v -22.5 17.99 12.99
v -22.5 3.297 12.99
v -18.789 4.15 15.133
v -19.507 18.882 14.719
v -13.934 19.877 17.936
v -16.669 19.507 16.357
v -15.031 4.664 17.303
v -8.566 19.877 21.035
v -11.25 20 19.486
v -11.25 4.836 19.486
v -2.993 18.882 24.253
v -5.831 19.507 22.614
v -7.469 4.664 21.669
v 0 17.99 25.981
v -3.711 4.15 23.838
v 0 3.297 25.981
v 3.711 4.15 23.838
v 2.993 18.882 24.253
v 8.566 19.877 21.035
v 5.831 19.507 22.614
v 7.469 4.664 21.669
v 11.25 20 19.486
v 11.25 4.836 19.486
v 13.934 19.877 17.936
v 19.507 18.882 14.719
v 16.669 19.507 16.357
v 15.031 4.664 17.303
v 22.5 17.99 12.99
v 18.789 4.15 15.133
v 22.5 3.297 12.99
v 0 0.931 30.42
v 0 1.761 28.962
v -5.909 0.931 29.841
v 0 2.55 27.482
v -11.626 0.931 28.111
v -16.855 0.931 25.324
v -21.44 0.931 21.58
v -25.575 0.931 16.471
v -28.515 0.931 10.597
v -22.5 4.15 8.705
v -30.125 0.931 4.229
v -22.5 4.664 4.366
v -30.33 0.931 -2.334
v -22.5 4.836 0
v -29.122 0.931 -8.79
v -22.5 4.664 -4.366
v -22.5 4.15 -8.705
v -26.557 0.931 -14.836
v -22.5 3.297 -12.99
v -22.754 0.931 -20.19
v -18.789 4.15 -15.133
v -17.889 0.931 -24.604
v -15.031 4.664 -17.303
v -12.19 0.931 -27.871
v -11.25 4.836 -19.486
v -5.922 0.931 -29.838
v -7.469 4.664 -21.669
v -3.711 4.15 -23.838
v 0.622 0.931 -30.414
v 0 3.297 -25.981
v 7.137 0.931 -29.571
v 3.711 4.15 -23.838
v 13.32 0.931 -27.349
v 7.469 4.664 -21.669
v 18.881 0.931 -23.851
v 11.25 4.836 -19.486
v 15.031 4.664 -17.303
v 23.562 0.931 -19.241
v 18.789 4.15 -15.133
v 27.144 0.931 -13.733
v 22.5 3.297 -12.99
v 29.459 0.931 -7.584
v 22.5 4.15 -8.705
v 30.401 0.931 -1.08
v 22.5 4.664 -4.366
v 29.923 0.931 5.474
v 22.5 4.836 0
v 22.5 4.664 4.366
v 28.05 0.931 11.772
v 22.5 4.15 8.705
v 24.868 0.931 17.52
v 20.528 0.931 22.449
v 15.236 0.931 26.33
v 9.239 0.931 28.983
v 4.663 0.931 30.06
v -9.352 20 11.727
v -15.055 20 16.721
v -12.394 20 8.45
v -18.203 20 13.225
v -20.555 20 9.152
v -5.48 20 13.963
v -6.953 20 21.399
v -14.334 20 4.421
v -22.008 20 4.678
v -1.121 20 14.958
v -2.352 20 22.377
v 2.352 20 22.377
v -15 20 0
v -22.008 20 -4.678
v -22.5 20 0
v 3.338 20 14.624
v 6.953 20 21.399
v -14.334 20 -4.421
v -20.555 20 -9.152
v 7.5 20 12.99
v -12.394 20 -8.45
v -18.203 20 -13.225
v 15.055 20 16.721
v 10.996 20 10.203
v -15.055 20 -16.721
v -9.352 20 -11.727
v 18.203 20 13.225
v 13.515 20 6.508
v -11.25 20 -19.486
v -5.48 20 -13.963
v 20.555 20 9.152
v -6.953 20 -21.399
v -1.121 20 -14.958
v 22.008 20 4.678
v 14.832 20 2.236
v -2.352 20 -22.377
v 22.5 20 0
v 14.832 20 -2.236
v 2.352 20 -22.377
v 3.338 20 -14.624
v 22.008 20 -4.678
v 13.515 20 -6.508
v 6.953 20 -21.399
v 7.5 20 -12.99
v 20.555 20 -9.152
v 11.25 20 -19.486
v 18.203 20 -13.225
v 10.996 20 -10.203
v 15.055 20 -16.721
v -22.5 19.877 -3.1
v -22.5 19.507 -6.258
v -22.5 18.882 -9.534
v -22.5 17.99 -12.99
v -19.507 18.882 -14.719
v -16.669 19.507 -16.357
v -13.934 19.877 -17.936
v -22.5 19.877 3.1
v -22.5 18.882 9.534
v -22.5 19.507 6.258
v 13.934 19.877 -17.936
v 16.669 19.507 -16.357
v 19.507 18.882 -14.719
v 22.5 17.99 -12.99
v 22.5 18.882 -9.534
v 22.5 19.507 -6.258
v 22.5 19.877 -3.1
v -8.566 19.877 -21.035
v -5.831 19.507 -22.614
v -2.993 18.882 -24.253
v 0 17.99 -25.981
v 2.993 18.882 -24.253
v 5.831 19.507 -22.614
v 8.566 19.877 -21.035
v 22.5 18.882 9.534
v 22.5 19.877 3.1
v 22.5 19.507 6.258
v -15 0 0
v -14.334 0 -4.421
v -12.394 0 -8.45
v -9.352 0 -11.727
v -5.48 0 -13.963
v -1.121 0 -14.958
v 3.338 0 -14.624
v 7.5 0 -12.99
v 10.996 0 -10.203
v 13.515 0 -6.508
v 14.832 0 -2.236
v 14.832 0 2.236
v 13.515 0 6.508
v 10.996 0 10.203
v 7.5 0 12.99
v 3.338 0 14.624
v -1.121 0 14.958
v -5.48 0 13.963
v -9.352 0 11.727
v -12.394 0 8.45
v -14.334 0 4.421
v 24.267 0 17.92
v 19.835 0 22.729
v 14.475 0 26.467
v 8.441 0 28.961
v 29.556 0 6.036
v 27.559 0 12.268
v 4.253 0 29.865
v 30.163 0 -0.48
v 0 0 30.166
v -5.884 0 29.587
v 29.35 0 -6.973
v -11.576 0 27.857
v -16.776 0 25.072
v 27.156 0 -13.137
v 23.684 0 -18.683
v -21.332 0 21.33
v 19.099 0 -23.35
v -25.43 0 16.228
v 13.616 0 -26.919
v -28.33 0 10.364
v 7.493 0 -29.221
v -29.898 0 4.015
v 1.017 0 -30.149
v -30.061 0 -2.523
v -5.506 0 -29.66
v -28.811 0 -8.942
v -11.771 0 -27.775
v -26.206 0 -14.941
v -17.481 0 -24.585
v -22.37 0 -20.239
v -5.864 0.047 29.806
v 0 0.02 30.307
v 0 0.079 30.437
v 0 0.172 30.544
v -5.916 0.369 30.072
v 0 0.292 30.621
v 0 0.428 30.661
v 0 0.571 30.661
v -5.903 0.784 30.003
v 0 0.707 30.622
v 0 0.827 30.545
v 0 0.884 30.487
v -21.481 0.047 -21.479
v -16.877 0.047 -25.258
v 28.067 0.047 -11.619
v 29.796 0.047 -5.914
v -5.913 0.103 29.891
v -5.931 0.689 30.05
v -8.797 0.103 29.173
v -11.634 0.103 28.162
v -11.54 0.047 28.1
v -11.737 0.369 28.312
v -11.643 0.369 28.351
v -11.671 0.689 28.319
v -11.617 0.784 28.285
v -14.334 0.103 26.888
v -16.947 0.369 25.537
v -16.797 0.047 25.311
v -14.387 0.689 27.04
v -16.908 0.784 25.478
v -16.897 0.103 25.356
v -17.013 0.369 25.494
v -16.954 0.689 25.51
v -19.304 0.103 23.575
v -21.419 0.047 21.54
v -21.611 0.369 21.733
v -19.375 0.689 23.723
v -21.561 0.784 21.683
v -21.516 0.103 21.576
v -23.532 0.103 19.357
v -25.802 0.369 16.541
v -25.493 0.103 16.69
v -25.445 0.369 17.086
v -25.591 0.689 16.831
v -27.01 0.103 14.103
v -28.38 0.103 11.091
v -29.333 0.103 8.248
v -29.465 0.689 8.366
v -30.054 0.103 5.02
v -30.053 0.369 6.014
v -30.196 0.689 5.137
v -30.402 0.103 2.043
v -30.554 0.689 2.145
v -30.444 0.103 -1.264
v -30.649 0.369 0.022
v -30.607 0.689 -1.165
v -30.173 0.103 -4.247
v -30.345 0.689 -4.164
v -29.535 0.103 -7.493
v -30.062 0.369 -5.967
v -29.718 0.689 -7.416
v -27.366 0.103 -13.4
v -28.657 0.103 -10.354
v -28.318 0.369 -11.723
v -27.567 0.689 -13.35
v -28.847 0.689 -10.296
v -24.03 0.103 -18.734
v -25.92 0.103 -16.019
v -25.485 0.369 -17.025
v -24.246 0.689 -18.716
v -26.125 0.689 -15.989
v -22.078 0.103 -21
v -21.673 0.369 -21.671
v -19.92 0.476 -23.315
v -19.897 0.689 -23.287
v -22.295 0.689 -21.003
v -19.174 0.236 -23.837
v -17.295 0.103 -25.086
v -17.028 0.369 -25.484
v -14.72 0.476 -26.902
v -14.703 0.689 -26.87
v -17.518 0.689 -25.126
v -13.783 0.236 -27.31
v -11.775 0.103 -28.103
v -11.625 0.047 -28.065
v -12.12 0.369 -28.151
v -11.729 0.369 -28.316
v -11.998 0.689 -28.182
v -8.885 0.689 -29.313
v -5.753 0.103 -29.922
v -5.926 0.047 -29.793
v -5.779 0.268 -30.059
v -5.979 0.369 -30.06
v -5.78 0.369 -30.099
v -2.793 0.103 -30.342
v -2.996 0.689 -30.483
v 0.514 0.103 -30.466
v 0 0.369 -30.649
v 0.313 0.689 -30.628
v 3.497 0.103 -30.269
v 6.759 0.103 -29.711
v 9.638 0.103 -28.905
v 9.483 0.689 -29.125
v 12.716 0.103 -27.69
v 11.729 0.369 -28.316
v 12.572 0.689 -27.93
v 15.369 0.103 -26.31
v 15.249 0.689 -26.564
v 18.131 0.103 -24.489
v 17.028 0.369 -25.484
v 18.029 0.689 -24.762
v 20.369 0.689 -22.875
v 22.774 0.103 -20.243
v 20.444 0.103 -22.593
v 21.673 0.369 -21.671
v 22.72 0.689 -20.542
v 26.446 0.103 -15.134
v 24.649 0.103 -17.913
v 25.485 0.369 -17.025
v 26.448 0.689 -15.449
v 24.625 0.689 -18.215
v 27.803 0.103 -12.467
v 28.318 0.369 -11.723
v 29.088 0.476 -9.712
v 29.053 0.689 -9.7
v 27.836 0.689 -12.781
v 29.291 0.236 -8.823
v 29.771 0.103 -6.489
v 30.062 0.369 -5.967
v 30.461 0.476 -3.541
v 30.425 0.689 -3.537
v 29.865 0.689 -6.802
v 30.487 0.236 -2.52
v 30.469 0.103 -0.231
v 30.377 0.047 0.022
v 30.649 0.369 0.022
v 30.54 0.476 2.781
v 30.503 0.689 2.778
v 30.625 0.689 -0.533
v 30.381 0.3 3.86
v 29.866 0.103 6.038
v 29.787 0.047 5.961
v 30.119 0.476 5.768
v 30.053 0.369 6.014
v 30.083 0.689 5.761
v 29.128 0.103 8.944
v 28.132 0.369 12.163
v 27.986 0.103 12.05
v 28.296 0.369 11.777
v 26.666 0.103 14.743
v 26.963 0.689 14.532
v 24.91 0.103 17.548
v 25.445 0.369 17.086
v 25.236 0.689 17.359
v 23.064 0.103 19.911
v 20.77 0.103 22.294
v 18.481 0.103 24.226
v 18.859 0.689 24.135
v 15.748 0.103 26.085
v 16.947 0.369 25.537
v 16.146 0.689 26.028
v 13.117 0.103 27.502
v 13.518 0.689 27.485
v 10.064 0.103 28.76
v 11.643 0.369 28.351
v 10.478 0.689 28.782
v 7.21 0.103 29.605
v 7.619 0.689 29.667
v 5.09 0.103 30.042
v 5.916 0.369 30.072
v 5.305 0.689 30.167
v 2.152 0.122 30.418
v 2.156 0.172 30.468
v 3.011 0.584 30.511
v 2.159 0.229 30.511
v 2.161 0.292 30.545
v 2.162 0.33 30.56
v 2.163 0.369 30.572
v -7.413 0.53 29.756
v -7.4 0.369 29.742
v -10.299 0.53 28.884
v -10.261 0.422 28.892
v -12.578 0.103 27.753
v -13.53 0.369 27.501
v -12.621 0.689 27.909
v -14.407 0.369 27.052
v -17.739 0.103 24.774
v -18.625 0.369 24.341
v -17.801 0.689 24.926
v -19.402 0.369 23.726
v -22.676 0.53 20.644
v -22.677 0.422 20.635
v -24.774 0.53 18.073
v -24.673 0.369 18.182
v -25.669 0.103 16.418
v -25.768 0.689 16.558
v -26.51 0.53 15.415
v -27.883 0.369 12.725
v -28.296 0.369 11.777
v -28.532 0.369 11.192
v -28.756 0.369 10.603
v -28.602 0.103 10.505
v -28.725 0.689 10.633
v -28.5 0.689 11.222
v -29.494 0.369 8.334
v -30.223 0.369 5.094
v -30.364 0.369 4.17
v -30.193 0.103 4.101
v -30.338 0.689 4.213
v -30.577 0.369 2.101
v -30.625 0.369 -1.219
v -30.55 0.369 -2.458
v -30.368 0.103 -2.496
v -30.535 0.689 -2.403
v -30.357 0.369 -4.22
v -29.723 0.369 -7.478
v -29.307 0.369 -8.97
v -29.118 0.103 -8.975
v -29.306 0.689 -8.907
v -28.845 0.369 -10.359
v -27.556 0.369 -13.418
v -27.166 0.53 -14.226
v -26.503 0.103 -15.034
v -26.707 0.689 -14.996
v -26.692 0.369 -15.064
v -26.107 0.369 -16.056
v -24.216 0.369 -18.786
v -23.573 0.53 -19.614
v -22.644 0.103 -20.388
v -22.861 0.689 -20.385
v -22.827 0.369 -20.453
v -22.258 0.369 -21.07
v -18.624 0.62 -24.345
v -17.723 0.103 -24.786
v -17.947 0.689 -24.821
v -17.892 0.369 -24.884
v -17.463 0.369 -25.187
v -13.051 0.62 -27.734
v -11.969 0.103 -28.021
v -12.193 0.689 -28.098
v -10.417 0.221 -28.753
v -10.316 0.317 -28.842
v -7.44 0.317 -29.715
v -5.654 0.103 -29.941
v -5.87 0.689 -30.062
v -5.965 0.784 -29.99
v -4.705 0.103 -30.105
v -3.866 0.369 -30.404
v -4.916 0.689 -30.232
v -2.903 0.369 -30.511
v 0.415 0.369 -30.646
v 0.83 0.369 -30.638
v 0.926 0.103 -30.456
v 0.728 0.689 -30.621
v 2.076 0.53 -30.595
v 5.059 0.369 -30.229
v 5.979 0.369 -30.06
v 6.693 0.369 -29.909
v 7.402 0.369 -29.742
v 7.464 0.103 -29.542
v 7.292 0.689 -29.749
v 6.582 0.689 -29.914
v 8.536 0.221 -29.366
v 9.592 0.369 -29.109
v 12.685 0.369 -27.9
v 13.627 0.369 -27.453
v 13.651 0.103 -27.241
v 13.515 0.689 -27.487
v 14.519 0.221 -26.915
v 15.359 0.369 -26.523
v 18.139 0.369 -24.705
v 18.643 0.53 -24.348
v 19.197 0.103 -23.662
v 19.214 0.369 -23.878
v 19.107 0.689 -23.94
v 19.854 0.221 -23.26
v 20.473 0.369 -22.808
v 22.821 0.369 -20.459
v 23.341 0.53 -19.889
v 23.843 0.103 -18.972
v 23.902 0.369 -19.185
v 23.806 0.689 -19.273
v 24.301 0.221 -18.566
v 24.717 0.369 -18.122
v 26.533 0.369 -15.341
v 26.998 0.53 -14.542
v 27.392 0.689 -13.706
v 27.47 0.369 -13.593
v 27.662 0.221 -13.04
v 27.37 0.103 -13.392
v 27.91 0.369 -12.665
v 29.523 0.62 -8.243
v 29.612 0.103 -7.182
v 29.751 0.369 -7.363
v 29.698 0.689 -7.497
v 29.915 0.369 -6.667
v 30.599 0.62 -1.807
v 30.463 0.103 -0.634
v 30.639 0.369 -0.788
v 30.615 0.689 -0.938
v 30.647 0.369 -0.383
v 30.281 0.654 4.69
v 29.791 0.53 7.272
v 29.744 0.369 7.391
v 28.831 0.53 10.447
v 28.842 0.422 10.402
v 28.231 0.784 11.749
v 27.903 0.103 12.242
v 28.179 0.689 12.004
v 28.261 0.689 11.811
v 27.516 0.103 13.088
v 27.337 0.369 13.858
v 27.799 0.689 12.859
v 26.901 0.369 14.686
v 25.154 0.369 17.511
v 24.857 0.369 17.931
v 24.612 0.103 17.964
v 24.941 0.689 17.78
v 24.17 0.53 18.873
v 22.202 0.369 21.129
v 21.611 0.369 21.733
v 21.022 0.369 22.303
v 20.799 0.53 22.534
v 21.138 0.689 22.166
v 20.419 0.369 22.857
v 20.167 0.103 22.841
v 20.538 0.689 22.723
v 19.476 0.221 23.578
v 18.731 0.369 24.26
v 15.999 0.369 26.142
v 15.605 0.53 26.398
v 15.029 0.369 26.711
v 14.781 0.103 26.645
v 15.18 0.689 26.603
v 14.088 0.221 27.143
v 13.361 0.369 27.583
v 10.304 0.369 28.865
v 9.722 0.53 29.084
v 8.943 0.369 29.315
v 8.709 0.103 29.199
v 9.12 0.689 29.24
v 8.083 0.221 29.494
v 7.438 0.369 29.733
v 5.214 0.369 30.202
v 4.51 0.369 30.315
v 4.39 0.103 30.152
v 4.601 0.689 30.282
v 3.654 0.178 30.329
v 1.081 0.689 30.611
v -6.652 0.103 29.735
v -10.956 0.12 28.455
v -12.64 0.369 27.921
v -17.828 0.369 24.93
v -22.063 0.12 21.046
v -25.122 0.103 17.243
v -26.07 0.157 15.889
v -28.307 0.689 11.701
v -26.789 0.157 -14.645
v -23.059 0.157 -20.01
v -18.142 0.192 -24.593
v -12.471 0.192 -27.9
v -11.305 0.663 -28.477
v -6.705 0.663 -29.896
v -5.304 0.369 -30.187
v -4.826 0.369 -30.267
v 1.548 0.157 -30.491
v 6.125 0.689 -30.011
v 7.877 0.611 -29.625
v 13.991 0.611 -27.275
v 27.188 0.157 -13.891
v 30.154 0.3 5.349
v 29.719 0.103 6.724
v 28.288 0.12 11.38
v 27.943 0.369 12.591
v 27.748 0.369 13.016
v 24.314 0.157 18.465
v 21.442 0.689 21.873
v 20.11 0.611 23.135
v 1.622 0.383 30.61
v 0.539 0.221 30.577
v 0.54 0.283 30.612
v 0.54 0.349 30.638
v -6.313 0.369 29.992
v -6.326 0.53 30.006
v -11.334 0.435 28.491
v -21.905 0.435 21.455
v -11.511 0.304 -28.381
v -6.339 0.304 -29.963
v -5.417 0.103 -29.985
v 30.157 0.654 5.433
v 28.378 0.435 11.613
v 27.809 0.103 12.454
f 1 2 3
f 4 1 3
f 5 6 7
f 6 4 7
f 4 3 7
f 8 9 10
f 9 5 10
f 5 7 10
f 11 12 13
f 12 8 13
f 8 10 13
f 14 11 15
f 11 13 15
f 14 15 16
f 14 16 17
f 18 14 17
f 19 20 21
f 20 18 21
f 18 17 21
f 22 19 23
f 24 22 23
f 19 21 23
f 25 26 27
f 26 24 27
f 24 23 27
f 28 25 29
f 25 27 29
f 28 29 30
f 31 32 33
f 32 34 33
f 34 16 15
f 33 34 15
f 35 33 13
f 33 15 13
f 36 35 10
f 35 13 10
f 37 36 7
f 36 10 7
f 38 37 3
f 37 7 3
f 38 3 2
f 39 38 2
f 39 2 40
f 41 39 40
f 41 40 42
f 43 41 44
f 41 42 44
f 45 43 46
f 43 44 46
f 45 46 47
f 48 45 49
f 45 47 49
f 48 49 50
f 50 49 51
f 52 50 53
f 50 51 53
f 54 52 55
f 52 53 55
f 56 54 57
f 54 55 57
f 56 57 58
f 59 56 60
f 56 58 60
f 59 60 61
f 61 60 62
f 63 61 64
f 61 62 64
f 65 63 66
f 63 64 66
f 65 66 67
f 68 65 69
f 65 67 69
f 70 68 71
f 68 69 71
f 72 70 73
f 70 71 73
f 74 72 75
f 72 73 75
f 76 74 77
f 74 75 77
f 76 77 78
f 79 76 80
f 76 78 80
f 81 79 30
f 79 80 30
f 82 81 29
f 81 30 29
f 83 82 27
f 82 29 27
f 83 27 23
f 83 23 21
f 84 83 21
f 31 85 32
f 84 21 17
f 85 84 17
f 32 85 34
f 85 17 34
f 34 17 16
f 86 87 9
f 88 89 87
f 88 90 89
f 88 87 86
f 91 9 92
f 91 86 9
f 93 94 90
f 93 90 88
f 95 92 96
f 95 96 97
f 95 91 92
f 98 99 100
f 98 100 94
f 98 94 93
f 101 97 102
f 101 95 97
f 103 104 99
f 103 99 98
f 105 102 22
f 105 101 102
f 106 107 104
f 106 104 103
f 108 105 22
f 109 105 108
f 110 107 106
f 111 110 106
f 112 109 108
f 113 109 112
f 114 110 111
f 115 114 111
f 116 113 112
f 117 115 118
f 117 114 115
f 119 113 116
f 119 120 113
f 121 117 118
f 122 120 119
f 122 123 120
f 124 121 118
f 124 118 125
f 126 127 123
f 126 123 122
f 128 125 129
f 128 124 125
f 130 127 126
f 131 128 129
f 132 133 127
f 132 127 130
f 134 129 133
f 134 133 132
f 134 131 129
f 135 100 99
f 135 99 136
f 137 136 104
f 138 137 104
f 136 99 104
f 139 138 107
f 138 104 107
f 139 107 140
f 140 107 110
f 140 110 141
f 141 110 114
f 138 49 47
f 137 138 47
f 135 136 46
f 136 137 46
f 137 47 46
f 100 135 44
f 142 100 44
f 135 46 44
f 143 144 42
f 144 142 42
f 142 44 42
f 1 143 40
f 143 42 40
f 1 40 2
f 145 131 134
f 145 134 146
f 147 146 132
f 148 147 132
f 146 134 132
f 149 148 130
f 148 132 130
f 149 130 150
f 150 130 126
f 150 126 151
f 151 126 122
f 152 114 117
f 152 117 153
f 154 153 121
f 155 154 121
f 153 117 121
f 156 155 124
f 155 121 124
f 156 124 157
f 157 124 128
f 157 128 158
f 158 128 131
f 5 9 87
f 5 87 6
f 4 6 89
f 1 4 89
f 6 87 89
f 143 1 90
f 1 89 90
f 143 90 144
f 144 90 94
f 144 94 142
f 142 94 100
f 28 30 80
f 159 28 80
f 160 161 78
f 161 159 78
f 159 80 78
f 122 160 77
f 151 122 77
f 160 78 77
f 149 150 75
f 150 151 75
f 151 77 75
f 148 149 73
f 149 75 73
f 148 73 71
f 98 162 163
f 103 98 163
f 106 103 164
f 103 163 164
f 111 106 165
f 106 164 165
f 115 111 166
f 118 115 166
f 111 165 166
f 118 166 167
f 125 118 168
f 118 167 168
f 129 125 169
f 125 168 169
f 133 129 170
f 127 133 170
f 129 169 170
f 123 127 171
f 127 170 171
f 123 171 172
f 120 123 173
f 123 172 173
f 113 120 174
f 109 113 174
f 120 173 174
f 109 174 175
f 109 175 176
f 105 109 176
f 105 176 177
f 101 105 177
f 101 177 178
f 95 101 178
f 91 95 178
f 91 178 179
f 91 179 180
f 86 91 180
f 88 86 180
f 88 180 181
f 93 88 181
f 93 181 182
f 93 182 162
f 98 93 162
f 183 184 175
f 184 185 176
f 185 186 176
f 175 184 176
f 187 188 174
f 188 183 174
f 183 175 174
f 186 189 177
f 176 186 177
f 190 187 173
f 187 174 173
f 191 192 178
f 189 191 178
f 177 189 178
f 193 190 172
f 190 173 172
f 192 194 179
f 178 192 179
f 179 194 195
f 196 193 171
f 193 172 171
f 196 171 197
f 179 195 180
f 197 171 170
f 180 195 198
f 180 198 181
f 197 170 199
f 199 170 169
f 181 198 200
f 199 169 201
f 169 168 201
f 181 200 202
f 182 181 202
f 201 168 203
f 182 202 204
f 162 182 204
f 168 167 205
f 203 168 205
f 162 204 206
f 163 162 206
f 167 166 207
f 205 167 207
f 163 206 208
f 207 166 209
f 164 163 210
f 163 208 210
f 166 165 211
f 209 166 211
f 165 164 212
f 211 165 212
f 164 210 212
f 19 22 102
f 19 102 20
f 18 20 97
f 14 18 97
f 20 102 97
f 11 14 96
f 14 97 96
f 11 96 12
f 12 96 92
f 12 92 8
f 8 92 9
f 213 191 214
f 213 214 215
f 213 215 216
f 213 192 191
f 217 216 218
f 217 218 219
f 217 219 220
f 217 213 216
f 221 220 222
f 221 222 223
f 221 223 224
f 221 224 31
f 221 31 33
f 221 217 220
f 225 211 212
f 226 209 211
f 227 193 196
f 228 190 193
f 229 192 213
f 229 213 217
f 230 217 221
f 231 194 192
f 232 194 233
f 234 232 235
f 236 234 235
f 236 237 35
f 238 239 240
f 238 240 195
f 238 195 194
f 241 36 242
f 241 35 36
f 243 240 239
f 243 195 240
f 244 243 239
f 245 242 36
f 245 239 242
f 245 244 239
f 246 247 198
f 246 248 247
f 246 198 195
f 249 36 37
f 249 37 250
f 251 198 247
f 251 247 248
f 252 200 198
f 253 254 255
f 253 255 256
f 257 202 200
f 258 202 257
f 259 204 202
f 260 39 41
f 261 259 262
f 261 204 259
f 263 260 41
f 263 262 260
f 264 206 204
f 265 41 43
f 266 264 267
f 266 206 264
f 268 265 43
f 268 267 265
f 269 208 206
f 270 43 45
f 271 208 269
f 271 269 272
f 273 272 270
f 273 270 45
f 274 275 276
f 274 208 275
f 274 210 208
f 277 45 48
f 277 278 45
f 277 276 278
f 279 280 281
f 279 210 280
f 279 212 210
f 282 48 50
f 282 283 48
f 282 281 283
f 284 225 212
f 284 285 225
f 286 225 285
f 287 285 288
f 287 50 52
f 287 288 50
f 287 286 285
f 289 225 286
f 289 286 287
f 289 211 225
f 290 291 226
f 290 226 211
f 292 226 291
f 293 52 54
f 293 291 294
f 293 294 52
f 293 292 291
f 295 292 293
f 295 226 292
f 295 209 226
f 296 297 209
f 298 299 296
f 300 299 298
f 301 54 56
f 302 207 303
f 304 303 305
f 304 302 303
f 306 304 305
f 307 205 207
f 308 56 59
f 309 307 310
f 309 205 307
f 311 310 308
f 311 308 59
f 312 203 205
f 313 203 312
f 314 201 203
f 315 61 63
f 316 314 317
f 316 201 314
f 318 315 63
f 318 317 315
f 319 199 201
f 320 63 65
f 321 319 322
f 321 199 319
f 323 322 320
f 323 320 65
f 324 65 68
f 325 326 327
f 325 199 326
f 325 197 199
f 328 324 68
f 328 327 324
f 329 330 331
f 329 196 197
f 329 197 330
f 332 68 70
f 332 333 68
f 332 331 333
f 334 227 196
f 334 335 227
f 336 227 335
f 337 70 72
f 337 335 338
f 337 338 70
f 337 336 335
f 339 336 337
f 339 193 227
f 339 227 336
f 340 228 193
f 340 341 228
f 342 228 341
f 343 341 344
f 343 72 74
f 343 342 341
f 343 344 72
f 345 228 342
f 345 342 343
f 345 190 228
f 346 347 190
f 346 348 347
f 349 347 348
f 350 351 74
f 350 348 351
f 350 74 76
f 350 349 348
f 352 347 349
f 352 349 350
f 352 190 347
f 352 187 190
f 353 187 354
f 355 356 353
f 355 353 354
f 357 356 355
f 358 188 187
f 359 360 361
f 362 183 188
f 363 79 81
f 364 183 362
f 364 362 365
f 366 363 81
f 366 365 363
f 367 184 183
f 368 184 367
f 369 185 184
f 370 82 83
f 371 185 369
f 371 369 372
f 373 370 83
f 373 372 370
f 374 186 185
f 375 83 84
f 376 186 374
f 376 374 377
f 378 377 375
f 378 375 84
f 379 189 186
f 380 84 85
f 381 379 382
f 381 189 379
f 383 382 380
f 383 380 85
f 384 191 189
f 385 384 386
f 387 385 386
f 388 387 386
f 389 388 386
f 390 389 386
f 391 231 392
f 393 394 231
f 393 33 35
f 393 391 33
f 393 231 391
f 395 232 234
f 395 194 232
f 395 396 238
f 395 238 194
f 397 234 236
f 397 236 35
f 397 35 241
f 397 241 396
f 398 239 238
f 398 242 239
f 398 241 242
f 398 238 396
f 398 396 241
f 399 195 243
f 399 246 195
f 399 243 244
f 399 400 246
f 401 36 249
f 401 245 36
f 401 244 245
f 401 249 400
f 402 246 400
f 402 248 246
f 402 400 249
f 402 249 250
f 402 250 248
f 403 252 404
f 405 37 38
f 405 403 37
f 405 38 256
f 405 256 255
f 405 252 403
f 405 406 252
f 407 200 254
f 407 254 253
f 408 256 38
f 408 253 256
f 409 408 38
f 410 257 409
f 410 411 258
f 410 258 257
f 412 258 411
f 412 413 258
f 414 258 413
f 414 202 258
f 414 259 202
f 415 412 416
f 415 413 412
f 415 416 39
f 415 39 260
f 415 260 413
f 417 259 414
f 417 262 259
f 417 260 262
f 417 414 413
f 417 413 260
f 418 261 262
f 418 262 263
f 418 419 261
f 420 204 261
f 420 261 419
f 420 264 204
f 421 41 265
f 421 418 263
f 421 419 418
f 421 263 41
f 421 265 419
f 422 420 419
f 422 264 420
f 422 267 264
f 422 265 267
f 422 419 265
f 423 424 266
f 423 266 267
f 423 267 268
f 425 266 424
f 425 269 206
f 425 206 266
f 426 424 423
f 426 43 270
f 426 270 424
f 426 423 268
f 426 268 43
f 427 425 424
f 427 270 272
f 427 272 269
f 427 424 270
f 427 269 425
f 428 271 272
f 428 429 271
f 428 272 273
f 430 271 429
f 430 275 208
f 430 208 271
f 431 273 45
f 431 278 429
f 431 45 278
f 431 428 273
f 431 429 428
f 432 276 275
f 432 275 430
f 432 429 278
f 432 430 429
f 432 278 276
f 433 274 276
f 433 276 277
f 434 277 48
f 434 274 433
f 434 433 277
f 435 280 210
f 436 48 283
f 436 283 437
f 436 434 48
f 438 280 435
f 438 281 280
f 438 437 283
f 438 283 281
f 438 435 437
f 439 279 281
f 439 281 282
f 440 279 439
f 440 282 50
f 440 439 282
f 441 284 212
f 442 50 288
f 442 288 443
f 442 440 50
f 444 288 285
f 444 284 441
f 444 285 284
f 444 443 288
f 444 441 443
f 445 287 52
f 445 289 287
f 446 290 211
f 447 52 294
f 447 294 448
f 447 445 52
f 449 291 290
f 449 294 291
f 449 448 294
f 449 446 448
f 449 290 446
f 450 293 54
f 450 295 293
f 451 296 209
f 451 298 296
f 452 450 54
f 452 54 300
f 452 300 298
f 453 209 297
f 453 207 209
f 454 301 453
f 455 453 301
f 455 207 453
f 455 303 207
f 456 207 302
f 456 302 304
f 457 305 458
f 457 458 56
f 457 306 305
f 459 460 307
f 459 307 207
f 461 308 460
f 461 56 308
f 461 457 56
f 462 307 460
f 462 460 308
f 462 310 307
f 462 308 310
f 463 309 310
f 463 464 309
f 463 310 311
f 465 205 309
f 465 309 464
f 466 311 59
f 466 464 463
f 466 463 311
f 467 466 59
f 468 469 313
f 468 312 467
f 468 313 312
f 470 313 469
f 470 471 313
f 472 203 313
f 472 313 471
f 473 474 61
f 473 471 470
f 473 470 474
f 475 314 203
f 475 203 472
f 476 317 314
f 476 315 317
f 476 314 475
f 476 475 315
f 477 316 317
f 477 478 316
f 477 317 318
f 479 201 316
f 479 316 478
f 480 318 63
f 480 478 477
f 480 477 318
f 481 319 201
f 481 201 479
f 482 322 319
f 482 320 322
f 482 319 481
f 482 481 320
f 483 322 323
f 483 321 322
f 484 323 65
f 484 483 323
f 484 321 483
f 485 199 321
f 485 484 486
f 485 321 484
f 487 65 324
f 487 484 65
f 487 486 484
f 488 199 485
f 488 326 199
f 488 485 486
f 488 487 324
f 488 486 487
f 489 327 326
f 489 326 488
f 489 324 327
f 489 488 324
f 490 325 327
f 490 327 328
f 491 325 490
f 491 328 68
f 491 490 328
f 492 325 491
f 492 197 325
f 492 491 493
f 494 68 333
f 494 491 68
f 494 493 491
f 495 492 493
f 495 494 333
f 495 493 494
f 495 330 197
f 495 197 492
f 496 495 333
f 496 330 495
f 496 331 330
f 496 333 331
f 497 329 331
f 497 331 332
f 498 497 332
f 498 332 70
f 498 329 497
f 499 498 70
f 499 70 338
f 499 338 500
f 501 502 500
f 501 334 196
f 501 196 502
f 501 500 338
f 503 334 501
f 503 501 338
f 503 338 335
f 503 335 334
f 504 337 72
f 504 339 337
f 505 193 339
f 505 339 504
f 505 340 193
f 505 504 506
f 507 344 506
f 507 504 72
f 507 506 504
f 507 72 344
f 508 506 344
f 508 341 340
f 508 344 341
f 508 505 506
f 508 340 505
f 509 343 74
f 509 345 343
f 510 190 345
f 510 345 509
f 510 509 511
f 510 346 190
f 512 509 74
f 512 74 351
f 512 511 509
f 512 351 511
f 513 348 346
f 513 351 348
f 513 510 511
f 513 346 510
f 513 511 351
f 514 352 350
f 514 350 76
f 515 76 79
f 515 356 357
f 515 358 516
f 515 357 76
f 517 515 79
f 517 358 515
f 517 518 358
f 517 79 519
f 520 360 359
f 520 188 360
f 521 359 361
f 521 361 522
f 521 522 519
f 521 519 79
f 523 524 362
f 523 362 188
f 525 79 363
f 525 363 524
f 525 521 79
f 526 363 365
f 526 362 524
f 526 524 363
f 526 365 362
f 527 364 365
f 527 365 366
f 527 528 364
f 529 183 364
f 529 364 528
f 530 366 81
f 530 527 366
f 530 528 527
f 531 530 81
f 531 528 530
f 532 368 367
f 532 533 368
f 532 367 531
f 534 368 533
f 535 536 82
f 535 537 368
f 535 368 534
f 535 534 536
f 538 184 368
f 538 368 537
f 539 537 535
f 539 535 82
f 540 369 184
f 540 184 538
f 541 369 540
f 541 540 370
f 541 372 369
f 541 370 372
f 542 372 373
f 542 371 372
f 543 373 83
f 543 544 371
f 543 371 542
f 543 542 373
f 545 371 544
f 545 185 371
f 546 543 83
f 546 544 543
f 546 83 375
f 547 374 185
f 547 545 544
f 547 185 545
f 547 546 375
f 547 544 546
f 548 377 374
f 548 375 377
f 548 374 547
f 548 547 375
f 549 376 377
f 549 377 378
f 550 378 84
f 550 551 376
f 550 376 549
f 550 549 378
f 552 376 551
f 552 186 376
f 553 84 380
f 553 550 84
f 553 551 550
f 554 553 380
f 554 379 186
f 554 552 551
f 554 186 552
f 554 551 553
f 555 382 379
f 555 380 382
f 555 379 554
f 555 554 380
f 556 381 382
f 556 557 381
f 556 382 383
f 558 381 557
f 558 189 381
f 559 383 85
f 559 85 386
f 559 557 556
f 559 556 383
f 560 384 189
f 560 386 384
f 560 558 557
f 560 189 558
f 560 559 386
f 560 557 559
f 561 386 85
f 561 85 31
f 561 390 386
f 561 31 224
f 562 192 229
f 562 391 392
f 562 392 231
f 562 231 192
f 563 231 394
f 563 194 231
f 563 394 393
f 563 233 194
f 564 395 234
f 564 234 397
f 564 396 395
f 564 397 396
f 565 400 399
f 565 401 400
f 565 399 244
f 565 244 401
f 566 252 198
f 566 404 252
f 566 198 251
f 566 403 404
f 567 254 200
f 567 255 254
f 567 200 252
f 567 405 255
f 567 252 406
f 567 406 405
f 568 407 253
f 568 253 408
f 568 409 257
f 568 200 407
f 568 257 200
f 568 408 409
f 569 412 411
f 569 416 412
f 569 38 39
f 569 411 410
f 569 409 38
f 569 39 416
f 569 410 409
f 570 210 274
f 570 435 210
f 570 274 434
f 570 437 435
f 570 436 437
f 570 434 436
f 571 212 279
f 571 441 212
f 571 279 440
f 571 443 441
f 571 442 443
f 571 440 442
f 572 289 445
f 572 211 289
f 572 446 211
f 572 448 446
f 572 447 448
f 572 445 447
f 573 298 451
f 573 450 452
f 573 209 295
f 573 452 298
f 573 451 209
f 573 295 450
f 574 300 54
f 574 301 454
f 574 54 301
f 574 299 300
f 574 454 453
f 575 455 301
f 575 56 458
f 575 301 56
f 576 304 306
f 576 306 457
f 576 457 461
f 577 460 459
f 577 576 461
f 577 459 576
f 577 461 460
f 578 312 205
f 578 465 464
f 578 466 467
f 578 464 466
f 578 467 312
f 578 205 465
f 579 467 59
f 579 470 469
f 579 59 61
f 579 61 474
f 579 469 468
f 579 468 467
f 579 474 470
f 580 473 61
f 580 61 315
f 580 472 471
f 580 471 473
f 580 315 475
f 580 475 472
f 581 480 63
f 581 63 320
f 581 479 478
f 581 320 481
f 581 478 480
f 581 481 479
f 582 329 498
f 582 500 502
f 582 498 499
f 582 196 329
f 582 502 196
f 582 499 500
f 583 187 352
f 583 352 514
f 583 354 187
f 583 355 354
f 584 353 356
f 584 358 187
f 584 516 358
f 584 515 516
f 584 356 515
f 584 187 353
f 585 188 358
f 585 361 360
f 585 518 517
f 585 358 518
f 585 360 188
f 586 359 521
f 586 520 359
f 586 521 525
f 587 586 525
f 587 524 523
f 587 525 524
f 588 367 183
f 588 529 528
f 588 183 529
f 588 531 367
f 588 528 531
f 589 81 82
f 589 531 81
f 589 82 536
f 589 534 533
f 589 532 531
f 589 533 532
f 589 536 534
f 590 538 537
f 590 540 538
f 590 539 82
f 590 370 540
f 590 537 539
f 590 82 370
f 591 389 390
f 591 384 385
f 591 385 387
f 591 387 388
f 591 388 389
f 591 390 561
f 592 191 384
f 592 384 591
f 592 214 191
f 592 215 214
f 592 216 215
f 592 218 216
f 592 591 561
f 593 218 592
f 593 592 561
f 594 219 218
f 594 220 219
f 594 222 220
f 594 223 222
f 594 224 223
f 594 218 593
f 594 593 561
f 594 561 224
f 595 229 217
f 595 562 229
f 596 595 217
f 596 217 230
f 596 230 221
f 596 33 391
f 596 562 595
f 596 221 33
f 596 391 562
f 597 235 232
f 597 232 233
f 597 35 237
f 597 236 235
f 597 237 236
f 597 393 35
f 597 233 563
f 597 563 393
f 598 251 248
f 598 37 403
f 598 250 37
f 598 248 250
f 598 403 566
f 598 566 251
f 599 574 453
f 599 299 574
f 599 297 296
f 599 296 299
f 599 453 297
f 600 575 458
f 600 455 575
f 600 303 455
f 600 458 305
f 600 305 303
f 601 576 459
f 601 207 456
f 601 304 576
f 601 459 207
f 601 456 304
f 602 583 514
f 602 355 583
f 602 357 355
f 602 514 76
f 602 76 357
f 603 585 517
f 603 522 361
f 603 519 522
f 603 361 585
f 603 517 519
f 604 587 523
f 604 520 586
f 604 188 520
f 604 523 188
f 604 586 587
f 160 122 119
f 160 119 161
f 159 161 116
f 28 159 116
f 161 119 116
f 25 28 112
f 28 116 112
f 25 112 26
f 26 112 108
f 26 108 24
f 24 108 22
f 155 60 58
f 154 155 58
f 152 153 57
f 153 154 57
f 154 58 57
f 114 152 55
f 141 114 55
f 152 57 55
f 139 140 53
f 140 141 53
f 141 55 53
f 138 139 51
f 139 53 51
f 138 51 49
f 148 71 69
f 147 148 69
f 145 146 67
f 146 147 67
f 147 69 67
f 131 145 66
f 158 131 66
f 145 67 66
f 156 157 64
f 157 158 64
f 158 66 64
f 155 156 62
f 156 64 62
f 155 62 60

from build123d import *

# Parameters (mm, degrees)
BOSS_EXTRUDE1_DEPTH   = 20
FILLET1_R             = 0.5
F_1_0MM_DOWEL_HOLE1_D = 30


with BuildPart() as part:
    # Sketch1 → Boss-Extrude1 (new body)
    with BuildSketch(Plane(origin=(0, 0, 0), x_dir=(1, 0, 0), z_dir=(0, 1, 0))):
        Polygon((0, -25.980762114), (22.5, -12.990381057), (22.5, 12.990381057), (0, 25.980762114), (-22.5, 12.990381057), (-22.5, -12.990381057), align=None)
    extrude(amount=BOSS_EXTRUDE1_DEPTH)

    # Sketch2 → Revolve1 (revolve)
    with BuildSketch(Plane(origin=(0, 0, 0), x_dir=(0, 0, -1), z_dir=(1, 0, 0)), mode=Mode.PRIVATE) as revolve1_sk:
        with BuildLine():
            Line((0, 9.214199819), (0, 0))
            Line((0, 0), (31.95, 0))
            ThreePointArc((31.95, 0), (16.626063713, 6.864646525), (0, 9.214199819))
        make_face()
    revolve(revolve1_sk.sketch.rotate(Axis((0, 0, 0), (0, -1, 0)), 180), axis=Axis((0, 0, 0), (0, -1, 0)))

    # Fillet1
    fillet1_edges = [part.edges().sort_by_distance(p)[0] for p in [
        (0, 0, -31.95),
    ]]
    fillet(fillet1_edges, radius=FILLET1_R)

    # Ø1.0mm Dowel Hole1 (through all)
    with Locations(Plane(origin=(0, 20, 0), x_dir=(1, 0, 0), z_dir=(0, 1, 0))):
        with Locations((0, 0)):
            Hole(F_1_0MM_DOWEL_HOLE1_D / 2)

    # Sketch6 → Cut-Revolve2 (revolve, cut)
    with BuildSketch(Plane.XY, mode=Mode.PRIVATE) as cut_revolve2_sk:
        Polygon((22.5, 20), (28.5, 20), (28.5, 16.535898385), align=None)
    revolve(cut_revolve2_sk.sketch.rotate(Axis((0, 0, 0), (0, -1, 0)), 90), axis=Axis((0, 0, 0), (0, -1, 0)), mode=Mode.SUBTRACT)


solid = part.part
